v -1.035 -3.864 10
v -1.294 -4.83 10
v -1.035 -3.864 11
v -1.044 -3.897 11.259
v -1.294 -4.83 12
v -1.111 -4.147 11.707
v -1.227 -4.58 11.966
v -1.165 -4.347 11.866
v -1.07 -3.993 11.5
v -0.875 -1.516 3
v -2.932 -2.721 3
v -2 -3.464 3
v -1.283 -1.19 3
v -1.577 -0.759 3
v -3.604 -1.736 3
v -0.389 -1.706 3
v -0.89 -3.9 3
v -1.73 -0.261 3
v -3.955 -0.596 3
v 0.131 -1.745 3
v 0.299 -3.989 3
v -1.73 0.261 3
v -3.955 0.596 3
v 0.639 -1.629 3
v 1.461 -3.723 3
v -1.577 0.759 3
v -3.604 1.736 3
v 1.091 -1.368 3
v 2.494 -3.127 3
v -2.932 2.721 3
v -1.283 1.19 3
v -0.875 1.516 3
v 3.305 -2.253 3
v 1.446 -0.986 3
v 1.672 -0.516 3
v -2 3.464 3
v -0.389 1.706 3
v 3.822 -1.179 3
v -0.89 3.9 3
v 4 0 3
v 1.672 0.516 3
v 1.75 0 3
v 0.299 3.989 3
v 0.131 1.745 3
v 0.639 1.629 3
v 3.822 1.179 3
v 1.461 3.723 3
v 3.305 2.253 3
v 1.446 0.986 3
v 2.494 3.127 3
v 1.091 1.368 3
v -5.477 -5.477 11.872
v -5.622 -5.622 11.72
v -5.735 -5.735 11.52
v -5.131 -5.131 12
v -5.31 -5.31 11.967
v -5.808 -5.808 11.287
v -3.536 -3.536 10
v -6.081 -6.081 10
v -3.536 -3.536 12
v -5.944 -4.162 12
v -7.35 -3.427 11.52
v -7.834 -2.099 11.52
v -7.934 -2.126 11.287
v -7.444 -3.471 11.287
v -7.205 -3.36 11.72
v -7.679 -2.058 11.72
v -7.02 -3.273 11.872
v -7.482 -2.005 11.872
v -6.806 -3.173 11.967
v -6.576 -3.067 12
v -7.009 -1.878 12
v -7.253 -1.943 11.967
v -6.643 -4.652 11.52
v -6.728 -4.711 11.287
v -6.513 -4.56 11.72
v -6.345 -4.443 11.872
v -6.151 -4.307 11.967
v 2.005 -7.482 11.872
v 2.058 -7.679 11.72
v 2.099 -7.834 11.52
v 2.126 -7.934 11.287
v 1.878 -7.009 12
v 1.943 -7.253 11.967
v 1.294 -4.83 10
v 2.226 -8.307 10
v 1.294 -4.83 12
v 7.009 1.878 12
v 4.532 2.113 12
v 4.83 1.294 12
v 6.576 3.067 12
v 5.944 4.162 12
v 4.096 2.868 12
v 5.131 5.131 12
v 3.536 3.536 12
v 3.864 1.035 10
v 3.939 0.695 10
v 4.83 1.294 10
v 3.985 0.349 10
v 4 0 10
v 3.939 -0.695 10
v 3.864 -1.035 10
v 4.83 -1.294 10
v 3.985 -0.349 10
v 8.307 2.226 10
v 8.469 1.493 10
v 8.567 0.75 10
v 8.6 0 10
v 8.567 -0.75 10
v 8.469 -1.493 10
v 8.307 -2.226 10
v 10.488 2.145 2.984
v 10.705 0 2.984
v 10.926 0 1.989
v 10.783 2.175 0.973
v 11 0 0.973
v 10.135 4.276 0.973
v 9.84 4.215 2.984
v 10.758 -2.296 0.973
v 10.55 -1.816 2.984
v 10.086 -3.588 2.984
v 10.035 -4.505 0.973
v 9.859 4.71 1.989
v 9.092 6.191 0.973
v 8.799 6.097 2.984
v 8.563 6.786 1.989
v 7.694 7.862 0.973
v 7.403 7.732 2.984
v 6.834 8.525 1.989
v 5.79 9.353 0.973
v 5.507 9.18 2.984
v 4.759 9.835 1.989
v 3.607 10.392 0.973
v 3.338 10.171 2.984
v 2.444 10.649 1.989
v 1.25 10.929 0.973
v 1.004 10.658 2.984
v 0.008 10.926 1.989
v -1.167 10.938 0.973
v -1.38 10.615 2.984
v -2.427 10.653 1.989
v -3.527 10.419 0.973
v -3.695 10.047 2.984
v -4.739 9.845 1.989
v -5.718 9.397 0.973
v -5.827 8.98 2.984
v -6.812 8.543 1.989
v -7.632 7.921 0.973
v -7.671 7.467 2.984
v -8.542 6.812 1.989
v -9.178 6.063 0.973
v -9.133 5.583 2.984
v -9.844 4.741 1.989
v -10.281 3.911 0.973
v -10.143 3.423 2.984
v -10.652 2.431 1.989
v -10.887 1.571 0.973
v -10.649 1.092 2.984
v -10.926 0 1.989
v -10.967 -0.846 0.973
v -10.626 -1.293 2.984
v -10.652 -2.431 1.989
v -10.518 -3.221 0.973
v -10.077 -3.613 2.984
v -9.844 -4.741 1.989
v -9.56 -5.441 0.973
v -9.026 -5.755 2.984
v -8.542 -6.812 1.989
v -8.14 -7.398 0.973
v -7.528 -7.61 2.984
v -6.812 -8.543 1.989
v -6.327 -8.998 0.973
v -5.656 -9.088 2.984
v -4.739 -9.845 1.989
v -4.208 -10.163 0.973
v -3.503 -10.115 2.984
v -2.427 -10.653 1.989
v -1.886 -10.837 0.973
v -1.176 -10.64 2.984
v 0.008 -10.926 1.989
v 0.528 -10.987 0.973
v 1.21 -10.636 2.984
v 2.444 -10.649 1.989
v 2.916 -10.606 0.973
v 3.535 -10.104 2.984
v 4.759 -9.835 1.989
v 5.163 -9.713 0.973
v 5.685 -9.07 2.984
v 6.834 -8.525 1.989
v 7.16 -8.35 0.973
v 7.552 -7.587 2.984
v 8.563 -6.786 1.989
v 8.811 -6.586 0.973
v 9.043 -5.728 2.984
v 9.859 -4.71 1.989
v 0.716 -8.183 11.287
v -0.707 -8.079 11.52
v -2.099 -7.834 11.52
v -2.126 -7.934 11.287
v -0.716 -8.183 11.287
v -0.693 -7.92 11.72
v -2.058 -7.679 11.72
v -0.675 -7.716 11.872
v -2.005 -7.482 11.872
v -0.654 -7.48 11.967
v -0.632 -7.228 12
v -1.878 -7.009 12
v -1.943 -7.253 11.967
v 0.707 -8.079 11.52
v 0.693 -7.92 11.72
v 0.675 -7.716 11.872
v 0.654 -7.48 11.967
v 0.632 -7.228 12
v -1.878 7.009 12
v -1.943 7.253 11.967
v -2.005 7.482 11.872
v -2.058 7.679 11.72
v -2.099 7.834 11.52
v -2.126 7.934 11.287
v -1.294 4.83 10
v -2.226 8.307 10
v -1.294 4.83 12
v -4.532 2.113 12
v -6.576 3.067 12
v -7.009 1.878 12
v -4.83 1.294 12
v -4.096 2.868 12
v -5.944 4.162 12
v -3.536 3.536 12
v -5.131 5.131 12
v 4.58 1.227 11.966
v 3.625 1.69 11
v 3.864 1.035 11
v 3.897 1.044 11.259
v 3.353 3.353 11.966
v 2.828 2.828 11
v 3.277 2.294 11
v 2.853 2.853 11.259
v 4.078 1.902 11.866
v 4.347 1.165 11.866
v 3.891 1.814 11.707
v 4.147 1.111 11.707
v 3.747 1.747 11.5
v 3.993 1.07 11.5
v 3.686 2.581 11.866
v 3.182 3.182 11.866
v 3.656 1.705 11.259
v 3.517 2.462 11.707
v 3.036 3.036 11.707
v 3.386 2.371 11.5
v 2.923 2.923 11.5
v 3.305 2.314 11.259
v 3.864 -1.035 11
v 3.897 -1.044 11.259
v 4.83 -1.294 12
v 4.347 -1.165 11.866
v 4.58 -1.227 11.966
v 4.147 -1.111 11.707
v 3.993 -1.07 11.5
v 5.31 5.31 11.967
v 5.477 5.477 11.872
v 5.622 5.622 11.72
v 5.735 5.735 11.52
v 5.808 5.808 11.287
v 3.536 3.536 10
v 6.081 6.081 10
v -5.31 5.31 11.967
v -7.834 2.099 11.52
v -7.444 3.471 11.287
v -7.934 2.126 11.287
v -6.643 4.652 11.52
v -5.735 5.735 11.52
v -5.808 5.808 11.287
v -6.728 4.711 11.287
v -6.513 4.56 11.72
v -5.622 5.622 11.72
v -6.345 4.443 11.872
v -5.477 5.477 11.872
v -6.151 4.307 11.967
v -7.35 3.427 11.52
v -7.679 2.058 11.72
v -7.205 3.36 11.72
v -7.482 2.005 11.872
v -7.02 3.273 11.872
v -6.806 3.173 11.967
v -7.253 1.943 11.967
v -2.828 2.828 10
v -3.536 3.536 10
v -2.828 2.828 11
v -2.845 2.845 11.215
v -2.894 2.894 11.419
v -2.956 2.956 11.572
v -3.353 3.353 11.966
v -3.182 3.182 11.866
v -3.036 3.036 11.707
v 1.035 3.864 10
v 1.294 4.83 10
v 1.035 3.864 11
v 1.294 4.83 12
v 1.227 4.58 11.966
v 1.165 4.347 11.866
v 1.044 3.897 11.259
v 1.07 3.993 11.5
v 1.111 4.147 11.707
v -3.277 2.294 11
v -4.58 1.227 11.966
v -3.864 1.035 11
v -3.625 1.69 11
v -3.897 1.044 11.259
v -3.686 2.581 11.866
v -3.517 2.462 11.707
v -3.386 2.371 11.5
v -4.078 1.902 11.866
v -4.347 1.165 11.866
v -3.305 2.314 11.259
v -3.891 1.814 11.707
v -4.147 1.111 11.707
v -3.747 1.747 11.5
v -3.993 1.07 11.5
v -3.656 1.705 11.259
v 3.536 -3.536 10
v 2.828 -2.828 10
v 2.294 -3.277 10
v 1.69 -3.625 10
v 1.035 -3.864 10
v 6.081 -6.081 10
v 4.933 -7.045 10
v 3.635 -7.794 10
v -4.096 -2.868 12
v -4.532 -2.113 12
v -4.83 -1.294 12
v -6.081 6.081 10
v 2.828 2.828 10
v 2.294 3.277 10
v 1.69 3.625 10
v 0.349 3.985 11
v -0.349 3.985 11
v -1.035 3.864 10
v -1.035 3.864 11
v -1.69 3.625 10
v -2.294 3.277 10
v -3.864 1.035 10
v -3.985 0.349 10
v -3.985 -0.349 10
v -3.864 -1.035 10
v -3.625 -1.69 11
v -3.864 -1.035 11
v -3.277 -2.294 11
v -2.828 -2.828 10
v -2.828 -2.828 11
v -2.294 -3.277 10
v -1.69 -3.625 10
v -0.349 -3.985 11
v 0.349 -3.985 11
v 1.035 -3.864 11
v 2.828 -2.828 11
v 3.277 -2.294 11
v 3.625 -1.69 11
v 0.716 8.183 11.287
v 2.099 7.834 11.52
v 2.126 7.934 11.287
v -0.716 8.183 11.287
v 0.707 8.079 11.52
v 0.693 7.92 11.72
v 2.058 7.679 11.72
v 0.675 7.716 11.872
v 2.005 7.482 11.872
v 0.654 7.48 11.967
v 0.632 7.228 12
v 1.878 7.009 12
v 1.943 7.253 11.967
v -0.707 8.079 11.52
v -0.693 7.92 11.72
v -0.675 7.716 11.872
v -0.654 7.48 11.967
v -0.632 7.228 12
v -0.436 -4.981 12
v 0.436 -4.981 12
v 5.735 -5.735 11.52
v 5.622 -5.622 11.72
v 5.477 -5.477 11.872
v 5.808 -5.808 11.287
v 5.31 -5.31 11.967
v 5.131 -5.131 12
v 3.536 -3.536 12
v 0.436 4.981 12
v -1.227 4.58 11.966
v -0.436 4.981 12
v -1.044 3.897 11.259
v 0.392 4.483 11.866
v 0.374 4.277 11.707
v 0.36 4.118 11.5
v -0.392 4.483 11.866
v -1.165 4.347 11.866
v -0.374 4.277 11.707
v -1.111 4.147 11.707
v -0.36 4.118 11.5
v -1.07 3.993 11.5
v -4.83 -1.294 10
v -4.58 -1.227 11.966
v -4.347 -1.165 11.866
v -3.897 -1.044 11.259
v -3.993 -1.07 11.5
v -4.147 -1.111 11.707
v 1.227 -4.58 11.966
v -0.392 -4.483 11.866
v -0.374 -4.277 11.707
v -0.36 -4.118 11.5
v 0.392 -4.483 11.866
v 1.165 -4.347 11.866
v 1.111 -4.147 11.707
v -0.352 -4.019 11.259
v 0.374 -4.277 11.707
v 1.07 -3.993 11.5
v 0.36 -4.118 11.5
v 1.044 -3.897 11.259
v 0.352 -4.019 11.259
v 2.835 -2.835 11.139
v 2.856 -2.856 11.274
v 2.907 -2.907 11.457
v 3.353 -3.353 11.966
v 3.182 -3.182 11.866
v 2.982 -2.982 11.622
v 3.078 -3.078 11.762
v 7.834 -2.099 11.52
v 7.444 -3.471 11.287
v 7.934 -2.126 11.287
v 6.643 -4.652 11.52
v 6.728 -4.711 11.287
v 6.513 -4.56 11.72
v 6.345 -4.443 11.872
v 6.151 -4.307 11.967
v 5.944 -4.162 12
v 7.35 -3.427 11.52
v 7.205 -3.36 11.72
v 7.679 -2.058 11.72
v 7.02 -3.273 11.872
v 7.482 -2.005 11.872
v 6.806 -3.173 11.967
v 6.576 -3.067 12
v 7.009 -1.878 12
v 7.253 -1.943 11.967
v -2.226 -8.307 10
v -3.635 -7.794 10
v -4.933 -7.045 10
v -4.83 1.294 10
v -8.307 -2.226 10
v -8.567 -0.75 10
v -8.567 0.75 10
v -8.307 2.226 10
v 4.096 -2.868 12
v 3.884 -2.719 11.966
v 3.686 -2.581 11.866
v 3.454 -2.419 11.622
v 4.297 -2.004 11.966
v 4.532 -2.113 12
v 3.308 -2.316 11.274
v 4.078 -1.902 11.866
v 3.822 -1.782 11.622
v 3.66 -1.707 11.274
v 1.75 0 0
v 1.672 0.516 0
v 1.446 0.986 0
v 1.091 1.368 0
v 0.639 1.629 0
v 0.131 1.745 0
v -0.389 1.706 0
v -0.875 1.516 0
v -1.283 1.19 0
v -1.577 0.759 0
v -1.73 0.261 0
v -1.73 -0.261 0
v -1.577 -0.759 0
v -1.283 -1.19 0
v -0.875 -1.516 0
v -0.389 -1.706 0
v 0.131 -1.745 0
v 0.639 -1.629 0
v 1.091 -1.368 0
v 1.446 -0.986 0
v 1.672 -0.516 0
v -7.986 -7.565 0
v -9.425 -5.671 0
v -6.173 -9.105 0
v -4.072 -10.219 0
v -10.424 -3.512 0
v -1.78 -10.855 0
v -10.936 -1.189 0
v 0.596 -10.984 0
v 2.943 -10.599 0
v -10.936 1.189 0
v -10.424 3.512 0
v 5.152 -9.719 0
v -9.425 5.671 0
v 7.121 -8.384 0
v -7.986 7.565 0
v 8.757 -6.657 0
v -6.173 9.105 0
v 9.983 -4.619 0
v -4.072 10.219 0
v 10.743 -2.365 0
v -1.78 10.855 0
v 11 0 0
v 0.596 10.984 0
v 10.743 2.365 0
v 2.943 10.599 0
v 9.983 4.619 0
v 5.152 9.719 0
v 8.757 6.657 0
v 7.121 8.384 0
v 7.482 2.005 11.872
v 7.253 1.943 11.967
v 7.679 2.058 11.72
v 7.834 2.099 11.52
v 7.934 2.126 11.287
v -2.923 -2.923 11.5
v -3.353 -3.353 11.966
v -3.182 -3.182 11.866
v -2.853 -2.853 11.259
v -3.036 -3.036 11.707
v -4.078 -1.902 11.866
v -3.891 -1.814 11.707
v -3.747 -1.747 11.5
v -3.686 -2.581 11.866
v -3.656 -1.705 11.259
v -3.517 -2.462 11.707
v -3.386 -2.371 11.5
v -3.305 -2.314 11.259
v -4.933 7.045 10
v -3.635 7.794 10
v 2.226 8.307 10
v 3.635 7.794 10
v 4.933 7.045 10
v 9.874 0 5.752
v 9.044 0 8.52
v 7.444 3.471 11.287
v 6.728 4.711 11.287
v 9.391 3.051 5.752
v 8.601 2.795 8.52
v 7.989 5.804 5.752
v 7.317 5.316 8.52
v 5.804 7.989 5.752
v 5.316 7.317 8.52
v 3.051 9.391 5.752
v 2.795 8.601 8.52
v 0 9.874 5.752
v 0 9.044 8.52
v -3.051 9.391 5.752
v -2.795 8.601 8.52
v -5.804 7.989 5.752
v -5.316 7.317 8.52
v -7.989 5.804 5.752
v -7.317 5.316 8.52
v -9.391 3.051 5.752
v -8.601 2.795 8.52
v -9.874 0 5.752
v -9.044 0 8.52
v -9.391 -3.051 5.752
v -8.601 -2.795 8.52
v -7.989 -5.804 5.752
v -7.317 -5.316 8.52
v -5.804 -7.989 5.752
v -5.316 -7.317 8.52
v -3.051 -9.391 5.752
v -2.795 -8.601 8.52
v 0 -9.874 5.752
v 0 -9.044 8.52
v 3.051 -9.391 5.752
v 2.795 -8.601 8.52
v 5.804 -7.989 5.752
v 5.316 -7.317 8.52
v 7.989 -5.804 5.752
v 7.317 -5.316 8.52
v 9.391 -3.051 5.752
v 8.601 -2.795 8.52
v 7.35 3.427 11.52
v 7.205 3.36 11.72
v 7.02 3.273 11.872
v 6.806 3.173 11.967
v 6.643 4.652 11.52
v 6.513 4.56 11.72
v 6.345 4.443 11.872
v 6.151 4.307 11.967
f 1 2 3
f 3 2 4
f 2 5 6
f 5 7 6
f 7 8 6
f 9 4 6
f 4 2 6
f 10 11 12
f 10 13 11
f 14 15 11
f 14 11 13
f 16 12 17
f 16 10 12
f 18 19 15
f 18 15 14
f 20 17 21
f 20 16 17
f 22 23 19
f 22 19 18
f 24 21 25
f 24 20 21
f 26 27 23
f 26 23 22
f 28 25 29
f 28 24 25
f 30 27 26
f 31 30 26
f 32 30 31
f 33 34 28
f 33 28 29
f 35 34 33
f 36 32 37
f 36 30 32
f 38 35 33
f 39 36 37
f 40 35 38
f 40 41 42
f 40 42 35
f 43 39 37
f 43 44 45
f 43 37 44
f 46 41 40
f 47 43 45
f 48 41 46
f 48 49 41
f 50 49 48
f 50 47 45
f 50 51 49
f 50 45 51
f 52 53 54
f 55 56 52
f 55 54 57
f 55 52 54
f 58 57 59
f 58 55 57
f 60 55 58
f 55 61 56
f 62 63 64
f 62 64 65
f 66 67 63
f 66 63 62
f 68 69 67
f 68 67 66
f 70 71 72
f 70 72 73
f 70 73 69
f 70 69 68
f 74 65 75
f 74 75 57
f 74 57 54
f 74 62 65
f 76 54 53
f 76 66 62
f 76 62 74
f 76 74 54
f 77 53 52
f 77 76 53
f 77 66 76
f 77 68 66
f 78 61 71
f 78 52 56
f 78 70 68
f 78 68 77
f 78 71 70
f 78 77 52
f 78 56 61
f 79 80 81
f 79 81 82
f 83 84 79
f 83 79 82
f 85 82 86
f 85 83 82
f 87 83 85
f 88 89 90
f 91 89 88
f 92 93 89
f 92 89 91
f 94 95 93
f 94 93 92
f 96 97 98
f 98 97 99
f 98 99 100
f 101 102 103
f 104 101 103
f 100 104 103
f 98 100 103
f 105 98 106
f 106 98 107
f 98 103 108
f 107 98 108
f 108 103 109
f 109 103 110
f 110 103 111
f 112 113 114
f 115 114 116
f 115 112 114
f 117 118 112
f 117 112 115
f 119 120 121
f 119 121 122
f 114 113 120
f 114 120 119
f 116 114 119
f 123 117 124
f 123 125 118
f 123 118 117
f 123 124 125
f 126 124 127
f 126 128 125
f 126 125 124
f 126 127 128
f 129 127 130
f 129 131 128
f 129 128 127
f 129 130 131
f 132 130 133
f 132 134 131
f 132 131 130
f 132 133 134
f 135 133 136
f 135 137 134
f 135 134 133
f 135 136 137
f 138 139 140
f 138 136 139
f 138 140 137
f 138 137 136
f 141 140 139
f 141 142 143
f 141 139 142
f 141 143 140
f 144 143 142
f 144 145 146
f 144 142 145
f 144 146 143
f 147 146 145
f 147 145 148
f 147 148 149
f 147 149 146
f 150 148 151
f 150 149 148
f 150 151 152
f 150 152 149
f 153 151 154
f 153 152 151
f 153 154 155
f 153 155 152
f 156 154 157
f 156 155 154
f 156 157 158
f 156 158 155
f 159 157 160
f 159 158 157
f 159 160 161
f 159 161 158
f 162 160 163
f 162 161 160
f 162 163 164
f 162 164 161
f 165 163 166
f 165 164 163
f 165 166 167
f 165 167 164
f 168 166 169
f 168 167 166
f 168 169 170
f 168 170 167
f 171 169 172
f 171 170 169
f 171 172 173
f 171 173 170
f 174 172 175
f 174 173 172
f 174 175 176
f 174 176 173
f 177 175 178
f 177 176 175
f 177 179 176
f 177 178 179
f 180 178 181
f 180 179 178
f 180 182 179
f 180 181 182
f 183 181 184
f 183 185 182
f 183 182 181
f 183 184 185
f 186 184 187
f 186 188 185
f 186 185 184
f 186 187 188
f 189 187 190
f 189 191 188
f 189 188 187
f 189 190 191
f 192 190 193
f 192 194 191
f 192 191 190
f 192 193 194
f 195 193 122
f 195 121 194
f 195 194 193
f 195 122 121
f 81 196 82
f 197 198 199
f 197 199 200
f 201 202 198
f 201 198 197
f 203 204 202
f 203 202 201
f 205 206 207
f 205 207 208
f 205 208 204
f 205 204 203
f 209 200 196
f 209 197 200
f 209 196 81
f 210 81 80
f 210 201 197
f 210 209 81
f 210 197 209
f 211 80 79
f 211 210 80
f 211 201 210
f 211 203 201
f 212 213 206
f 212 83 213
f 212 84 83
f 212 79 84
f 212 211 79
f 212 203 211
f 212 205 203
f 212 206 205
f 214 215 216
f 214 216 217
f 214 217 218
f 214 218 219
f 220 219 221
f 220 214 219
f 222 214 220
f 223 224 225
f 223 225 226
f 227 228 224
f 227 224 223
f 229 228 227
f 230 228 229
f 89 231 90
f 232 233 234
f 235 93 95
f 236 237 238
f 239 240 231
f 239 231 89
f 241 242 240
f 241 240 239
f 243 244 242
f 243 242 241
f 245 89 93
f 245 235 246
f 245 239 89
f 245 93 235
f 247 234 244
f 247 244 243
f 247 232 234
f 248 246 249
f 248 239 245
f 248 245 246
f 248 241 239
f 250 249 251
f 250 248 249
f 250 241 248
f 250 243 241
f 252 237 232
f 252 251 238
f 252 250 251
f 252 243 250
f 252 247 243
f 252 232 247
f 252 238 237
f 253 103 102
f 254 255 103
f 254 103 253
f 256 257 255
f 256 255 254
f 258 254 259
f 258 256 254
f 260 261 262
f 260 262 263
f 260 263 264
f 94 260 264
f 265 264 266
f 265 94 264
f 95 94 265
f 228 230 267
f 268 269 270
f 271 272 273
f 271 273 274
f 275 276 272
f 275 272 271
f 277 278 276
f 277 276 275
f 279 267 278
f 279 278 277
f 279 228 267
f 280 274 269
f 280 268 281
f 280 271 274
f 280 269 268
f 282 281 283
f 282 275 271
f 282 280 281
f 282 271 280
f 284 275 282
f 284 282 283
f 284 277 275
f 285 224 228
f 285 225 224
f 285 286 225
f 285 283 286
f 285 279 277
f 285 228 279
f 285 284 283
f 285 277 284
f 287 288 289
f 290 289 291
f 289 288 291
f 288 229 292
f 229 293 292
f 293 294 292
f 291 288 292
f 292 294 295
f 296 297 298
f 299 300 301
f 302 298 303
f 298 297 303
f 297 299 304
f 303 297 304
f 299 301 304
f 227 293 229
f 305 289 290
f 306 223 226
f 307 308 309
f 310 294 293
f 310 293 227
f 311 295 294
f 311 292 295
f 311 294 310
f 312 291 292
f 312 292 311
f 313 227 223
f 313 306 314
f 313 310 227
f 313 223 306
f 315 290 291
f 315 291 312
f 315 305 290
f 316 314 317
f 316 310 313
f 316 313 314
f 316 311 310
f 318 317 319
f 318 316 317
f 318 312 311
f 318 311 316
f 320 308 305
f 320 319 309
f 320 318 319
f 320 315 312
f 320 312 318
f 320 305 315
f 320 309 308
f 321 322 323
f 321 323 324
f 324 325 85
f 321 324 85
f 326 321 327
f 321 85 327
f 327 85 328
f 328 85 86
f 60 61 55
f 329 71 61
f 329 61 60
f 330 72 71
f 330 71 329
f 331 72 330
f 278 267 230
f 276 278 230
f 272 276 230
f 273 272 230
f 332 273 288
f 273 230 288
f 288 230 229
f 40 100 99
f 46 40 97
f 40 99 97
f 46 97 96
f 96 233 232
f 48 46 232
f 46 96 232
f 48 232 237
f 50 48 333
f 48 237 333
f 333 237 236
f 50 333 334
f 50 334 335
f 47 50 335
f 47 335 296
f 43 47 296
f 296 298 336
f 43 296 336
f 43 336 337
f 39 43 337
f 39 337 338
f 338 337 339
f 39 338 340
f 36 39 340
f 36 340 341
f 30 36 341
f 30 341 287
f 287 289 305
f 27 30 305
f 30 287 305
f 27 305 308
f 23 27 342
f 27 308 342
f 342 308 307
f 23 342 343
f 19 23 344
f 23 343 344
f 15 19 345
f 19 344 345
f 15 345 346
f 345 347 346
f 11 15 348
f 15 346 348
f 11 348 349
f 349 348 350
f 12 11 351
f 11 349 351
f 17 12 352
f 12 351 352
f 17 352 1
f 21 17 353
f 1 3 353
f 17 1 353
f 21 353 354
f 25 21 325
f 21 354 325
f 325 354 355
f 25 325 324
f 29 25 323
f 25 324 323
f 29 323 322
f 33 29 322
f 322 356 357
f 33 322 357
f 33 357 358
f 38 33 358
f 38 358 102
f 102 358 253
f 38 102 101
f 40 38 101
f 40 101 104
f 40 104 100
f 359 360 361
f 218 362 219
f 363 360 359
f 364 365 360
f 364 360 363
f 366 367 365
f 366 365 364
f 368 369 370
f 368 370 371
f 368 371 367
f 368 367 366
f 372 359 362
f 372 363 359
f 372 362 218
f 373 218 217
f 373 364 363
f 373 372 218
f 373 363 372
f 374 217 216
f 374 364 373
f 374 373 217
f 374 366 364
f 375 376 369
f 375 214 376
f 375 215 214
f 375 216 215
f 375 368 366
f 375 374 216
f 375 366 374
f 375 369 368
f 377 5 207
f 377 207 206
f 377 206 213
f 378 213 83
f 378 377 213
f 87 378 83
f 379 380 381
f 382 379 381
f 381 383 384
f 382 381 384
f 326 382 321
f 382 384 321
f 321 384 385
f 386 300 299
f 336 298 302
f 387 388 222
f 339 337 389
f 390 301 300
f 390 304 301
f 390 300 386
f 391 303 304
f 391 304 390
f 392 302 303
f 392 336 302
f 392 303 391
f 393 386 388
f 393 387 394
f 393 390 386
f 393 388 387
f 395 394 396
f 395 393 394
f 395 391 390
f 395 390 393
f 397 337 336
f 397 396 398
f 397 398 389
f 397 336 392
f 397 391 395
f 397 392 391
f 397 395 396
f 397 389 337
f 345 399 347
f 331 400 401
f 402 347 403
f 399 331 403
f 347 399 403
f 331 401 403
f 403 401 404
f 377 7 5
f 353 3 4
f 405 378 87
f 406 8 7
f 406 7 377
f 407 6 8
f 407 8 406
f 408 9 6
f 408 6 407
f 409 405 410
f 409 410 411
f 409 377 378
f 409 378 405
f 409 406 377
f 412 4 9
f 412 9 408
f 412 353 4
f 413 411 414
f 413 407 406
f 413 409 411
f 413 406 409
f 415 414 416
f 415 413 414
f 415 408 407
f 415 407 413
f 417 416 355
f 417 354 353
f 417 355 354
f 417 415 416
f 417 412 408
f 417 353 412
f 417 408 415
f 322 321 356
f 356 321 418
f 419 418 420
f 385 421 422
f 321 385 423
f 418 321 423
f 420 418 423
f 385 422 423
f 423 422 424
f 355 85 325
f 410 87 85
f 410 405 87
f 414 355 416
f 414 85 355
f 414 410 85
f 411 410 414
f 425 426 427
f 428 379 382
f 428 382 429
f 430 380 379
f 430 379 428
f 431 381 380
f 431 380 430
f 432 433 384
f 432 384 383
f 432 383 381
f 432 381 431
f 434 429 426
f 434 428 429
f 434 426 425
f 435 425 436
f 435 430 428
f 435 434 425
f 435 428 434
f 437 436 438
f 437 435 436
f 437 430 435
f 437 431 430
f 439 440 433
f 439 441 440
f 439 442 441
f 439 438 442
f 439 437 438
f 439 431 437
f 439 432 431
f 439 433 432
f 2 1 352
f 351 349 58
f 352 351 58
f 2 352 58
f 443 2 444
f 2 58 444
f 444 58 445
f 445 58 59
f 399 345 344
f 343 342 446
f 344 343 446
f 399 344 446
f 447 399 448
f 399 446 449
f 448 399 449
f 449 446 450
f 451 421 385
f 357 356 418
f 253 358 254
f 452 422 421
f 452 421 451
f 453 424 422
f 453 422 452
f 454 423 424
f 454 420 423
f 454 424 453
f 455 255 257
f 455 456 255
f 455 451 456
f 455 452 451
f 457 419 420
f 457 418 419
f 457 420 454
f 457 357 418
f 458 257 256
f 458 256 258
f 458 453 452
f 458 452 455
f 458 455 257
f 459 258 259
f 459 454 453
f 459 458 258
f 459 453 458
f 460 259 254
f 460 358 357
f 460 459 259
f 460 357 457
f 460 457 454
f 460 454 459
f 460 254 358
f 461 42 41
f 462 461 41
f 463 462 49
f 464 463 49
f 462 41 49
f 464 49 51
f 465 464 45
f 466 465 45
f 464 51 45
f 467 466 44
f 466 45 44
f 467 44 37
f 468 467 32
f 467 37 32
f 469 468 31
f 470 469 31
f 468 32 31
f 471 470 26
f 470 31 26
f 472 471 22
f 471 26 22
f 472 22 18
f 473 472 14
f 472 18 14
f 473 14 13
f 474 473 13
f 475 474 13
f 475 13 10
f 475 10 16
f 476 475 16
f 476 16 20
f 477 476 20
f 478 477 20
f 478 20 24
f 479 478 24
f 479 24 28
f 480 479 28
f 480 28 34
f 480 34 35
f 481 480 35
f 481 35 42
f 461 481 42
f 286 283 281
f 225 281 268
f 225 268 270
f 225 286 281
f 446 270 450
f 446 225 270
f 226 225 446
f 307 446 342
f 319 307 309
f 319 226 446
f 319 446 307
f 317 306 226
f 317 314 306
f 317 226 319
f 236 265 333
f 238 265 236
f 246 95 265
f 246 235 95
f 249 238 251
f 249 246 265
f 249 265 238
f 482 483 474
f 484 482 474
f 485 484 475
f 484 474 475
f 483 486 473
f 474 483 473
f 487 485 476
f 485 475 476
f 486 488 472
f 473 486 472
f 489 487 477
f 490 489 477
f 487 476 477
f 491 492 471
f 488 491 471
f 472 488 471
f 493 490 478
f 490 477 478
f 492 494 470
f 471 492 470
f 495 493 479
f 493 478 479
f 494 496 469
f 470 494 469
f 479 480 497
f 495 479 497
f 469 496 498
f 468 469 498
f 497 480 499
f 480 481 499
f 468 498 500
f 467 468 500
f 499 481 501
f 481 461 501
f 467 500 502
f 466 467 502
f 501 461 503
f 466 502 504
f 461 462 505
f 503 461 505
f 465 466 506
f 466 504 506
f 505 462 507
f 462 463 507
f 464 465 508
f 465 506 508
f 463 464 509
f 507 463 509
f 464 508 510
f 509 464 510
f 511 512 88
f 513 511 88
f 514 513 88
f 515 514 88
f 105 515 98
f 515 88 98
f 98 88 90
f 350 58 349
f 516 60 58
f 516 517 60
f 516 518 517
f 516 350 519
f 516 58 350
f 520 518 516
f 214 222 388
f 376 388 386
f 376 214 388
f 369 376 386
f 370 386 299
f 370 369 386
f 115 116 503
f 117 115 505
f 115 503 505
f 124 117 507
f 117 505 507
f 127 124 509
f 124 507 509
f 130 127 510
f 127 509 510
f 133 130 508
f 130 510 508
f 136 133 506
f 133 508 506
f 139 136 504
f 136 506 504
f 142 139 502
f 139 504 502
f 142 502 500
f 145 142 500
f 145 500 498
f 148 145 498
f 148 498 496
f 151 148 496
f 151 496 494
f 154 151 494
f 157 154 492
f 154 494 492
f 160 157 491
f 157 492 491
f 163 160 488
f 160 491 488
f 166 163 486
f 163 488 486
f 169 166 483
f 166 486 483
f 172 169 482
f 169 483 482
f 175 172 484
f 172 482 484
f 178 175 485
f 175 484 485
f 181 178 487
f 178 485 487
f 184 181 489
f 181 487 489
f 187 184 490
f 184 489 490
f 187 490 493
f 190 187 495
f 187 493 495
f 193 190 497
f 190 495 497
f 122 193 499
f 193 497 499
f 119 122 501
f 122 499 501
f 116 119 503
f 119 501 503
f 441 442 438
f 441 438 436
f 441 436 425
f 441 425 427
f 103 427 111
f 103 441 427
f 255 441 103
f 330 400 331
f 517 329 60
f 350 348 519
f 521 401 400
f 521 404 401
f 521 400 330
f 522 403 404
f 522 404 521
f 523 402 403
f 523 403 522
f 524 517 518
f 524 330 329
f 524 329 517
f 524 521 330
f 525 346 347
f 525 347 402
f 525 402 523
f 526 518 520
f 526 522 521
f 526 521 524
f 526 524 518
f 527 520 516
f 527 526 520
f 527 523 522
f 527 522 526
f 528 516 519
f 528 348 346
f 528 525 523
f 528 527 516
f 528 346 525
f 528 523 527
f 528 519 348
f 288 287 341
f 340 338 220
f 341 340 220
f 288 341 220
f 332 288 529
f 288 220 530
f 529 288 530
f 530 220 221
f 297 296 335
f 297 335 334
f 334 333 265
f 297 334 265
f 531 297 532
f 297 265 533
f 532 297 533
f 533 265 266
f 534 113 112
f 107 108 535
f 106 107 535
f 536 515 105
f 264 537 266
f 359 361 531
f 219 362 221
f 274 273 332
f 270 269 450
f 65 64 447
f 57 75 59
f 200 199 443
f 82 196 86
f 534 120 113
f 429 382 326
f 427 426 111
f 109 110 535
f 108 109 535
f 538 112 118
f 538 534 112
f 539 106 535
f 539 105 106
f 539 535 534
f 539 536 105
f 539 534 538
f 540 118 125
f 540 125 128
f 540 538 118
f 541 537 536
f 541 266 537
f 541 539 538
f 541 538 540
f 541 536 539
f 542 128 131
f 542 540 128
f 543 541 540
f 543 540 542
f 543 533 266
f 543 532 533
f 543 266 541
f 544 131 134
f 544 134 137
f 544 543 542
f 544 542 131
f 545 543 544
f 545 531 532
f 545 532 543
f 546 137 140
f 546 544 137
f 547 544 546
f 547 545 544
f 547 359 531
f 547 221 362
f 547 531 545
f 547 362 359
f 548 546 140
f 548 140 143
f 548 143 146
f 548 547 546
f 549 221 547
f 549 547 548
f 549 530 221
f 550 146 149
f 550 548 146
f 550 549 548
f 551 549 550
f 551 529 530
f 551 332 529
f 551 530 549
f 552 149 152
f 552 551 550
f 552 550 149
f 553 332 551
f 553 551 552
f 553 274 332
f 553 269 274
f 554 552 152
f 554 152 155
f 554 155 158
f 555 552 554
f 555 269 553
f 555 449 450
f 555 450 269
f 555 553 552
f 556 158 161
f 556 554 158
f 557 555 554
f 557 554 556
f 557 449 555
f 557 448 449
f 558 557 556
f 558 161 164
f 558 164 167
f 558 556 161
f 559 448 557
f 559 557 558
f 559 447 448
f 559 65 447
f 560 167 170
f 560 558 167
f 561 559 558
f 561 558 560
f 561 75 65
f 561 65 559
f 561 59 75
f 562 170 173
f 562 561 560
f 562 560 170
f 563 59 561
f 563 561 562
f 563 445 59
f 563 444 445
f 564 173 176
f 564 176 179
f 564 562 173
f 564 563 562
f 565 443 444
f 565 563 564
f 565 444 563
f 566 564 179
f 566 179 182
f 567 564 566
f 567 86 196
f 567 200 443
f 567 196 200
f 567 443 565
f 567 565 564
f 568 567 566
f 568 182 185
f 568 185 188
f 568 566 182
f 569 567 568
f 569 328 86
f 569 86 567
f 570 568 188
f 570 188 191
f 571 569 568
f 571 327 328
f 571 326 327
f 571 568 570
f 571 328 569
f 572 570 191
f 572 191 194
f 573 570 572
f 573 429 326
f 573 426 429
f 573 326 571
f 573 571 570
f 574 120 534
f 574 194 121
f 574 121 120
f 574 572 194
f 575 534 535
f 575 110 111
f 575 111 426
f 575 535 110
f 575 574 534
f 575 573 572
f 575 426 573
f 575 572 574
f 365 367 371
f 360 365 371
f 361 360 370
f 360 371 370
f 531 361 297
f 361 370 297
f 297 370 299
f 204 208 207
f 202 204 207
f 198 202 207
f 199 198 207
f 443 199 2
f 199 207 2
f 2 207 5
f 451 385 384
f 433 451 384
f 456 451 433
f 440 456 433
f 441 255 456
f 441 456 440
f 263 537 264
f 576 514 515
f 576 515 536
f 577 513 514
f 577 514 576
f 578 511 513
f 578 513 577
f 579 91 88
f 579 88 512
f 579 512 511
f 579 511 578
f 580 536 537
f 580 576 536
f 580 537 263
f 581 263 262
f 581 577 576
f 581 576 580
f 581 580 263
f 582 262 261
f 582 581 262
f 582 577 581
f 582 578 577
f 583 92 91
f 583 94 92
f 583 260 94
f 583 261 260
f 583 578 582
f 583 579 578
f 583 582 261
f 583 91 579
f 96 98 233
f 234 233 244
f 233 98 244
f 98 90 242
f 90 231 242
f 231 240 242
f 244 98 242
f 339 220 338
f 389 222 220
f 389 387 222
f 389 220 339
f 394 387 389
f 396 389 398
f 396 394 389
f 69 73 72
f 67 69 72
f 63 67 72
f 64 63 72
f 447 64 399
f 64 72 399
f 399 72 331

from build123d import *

# Parameters (mm, degrees)
SKETCH_R           = 11
PAD_DEPTH          = 2
SKETCH001_R        = 11
SKETCH002_R        = 8
FILLET_R           = 7
SKETCH003_R        = 1.75
POCKET_DEPTH       = 12.001
SKETCH004_R        = 4
POCKET001_DEPTH    = 9
FILLET001_R        = 1
FILLET002_R        = 1
POCKET002_DEPTH    = 2
POLARPATTERN_COUNT = 6


with BuildPart() as part:
    # Sketch → Pad (new body)
    with BuildSketch(Plane.XY):
        Circle(SKETCH_R)
    extrude(amount=PAD_DEPTH)

    # Sketch001 (on Face3 of Pad) → AdditiveLoft section 0
    with BuildSketch(Plane.XY.offset(2)):
        Circle(SKETCH001_R)
    # Sketch002 (on DatumPlane) → AdditiveLoft section 1
    with BuildSketch(Plane.XY.offset(12)):
        Circle(SKETCH002_R)
    loft()

    # Fillet
    fillet_edges = [part.edges().sort_by_distance(p)[0] for p in [
        (-11, 0, 2),
    ]]
    fillet(fillet_edges, radius=FILLET_R)

    # Sketch003 (on Face5 of Fillet) → Pocket (cut, through all)
    with BuildSketch(Plane.XY.offset(12)):
        Circle(SKETCH003_R)
    extrude(amount=-POCKET_DEPTH, mode=Mode.SUBTRACT)

    # Sketch004 (on Face6 of Pocket) → Pocket001 (cut)
    with BuildSketch(Plane.XY.offset(12)):
        Circle(SKETCH004_R)
    extrude(amount=-POCKET001_DEPTH, mode=Mode.SUBTRACT)

    # Fillet001
    fillet001_edges = [part.edges().sort_by_distance(p)[0] for p in [
        (-8, 0, 12),
    ]]
    fillet(fillet001_edges, radius=FILLET001_R)

    # Fillet002
    fillet002_edges = [part.edges().sort_by_distance(p)[0] for p in [
        (-4, 0, 12),
    ]]
    fillet(fillet002_edges, radius=FILLET002_R)

    # Sketch005 (on Face1 of Fillet002) → Pocket002 (cut)
    with BuildSketch(Plane.XY.offset(12)):
        with BuildLine():
            Line((-9.659258, 2.58819), (-4.829629, 1.294095))
            Line((-4.829629, 1.294095), (-1.931852, 0.517638))
            ThreePointArc((-1.931852, 0.517638), (-2, 0), (-1.931852, -0.517638))
            Line((-4.829629, -1.294095), (-1.931852, -0.517638))
            Line((-9.659258, -2.58819), (-4.829629, -1.294095))
            ThreePointArc((-9.659258, 2.58819), (-10, 0), (-9.659258, -2.58819))
        make_face()
    pocket002 = extrude(amount=-POCKET002_DEPTH, mode=Mode.SUBTRACT)

    # PolarPattern: Pocket002 ×6 about axis
    polarpattern_axis = Axis((0, 0, 12), (0, 0, 1))
    for i in range(1, POLARPATTERN_COUNT):
        add(pocket002.rotate(polarpattern_axis, i * 360 / POLARPATTERN_COUNT), mode=Mode.SUBTRACT)


solid = part.part
